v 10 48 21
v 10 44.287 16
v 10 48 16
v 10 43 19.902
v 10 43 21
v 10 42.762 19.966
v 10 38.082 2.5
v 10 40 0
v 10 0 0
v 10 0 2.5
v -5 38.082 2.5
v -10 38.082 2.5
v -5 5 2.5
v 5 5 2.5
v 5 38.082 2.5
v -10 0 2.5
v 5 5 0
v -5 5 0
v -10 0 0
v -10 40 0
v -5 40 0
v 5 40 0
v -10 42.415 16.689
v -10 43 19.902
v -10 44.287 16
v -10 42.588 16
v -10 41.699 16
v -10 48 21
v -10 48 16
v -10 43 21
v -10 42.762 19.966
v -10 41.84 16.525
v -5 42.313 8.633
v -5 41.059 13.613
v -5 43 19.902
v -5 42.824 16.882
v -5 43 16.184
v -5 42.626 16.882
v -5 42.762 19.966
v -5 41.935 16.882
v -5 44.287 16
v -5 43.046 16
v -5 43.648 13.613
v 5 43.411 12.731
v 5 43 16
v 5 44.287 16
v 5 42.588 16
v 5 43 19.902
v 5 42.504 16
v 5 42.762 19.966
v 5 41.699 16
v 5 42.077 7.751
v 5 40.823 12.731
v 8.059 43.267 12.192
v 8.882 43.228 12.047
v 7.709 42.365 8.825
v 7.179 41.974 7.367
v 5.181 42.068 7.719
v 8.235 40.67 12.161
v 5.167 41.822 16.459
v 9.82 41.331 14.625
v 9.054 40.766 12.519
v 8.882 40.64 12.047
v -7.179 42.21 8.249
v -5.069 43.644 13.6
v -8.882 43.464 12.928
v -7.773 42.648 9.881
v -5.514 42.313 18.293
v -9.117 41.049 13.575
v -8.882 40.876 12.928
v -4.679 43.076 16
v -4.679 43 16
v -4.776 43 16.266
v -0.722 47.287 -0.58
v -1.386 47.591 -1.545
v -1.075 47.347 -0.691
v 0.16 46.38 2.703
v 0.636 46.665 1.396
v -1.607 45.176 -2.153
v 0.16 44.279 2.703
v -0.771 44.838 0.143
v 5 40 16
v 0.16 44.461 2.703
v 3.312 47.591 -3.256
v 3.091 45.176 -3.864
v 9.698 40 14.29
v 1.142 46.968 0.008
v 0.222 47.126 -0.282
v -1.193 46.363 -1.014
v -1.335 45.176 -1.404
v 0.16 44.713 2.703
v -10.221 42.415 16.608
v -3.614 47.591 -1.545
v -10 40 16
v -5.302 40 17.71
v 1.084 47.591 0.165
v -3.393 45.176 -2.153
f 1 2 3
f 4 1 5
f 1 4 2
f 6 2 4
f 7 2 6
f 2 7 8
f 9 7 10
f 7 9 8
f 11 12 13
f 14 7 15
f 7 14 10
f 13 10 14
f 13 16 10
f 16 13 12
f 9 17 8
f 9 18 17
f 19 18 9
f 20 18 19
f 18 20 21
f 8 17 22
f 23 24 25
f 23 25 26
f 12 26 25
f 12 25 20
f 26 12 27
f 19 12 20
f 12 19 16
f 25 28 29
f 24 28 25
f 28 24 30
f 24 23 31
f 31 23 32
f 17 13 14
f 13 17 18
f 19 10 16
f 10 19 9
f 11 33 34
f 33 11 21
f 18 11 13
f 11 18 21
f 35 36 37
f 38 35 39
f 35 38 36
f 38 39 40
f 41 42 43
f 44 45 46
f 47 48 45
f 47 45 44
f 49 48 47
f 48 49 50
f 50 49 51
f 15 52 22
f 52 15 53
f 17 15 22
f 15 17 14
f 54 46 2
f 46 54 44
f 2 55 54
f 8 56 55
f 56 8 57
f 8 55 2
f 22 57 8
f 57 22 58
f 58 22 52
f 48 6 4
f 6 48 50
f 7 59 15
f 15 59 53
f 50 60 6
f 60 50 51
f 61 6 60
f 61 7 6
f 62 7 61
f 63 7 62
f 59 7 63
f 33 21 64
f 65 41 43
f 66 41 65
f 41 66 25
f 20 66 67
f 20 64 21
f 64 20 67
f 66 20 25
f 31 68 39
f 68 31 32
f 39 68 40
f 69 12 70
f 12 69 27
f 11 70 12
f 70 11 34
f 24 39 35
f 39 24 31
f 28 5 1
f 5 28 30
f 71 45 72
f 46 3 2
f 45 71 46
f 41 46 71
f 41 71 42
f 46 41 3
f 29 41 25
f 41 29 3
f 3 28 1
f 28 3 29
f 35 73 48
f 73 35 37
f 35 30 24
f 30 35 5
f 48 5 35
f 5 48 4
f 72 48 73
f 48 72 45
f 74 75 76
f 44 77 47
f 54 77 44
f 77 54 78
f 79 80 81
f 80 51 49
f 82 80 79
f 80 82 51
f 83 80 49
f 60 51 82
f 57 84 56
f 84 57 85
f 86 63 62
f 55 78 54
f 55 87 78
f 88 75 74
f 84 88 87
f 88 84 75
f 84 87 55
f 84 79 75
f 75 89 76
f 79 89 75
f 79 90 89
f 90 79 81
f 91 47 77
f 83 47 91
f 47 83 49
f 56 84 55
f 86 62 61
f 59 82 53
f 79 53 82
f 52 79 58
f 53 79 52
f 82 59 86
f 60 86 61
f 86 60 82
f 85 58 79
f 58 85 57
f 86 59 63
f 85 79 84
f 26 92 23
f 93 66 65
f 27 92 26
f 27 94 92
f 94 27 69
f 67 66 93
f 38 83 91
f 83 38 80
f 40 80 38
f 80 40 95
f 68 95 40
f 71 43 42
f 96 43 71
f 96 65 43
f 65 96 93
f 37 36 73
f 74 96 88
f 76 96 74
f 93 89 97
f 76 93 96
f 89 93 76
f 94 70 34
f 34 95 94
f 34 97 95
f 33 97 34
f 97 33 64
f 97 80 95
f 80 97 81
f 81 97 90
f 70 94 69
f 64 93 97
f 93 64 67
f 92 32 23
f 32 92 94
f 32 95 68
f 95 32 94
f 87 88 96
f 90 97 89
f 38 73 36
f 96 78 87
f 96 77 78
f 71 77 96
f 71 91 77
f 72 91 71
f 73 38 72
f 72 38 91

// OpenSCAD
frontMouthWidth = 20;
mouthLenght = 40;
botJawHeight = 20;

javAxelY = mouthLenght+ 3;
javAxelZ = botJawHeight-4;

bitWidth = 5;
bitHeight = 2.5;


// alahuuli etu
translate([-frontMouthWidth/2, 0, 0]){
	cube([frontMouthWidth, bitWidth, bitHeight]);
} 
// alahuulet sivu
translate([-frontMouthWidth/2, 0, 0]){
	cube([bitWidth, mouthLenght, bitHeight]);
} 
translate([frontMouthWidth/2-bitWidth, 0, 0]){
	cube([bitWidth, mouthLenght, bitHeight]);
} 
// alaleukaluu viistosti ylos
translate([frontMouthWidth/2-bitWidth, mouthLenght , 0])rotate([75]){
	cube([bitWidth, botJawHeight, bitHeight]);
} 
translate([-frontMouthWidth/2, mouthLenght , 0])rotate([75]){
	cube([bitWidth, botJawHeight, bitHeight]);
} 
// botJaw Axelplace
translate([-frontMouthWidth/2, javAxelY , javAxelZ ]){
	cube([frontMouthWidth, bitWidth, bitWidth]);
} 
// alaleukaluu viistosti ylos
translate([frontMouthWidth/2-bitWidth, mouthLenght ,javAxelZ])rotate([-75, 20, 0]){
	#cube([bitWidth, botJawHeight, bitHeight]);
} 
translate([-frontMouthWidth/2, mouthLenght , javAxelZ])rotate([-75, -20, 0]){
	#cube([bitWidth, botJawHeight, bitHeight]);
}






	//cylinder(10 ,20,20  , $fn = 40);
